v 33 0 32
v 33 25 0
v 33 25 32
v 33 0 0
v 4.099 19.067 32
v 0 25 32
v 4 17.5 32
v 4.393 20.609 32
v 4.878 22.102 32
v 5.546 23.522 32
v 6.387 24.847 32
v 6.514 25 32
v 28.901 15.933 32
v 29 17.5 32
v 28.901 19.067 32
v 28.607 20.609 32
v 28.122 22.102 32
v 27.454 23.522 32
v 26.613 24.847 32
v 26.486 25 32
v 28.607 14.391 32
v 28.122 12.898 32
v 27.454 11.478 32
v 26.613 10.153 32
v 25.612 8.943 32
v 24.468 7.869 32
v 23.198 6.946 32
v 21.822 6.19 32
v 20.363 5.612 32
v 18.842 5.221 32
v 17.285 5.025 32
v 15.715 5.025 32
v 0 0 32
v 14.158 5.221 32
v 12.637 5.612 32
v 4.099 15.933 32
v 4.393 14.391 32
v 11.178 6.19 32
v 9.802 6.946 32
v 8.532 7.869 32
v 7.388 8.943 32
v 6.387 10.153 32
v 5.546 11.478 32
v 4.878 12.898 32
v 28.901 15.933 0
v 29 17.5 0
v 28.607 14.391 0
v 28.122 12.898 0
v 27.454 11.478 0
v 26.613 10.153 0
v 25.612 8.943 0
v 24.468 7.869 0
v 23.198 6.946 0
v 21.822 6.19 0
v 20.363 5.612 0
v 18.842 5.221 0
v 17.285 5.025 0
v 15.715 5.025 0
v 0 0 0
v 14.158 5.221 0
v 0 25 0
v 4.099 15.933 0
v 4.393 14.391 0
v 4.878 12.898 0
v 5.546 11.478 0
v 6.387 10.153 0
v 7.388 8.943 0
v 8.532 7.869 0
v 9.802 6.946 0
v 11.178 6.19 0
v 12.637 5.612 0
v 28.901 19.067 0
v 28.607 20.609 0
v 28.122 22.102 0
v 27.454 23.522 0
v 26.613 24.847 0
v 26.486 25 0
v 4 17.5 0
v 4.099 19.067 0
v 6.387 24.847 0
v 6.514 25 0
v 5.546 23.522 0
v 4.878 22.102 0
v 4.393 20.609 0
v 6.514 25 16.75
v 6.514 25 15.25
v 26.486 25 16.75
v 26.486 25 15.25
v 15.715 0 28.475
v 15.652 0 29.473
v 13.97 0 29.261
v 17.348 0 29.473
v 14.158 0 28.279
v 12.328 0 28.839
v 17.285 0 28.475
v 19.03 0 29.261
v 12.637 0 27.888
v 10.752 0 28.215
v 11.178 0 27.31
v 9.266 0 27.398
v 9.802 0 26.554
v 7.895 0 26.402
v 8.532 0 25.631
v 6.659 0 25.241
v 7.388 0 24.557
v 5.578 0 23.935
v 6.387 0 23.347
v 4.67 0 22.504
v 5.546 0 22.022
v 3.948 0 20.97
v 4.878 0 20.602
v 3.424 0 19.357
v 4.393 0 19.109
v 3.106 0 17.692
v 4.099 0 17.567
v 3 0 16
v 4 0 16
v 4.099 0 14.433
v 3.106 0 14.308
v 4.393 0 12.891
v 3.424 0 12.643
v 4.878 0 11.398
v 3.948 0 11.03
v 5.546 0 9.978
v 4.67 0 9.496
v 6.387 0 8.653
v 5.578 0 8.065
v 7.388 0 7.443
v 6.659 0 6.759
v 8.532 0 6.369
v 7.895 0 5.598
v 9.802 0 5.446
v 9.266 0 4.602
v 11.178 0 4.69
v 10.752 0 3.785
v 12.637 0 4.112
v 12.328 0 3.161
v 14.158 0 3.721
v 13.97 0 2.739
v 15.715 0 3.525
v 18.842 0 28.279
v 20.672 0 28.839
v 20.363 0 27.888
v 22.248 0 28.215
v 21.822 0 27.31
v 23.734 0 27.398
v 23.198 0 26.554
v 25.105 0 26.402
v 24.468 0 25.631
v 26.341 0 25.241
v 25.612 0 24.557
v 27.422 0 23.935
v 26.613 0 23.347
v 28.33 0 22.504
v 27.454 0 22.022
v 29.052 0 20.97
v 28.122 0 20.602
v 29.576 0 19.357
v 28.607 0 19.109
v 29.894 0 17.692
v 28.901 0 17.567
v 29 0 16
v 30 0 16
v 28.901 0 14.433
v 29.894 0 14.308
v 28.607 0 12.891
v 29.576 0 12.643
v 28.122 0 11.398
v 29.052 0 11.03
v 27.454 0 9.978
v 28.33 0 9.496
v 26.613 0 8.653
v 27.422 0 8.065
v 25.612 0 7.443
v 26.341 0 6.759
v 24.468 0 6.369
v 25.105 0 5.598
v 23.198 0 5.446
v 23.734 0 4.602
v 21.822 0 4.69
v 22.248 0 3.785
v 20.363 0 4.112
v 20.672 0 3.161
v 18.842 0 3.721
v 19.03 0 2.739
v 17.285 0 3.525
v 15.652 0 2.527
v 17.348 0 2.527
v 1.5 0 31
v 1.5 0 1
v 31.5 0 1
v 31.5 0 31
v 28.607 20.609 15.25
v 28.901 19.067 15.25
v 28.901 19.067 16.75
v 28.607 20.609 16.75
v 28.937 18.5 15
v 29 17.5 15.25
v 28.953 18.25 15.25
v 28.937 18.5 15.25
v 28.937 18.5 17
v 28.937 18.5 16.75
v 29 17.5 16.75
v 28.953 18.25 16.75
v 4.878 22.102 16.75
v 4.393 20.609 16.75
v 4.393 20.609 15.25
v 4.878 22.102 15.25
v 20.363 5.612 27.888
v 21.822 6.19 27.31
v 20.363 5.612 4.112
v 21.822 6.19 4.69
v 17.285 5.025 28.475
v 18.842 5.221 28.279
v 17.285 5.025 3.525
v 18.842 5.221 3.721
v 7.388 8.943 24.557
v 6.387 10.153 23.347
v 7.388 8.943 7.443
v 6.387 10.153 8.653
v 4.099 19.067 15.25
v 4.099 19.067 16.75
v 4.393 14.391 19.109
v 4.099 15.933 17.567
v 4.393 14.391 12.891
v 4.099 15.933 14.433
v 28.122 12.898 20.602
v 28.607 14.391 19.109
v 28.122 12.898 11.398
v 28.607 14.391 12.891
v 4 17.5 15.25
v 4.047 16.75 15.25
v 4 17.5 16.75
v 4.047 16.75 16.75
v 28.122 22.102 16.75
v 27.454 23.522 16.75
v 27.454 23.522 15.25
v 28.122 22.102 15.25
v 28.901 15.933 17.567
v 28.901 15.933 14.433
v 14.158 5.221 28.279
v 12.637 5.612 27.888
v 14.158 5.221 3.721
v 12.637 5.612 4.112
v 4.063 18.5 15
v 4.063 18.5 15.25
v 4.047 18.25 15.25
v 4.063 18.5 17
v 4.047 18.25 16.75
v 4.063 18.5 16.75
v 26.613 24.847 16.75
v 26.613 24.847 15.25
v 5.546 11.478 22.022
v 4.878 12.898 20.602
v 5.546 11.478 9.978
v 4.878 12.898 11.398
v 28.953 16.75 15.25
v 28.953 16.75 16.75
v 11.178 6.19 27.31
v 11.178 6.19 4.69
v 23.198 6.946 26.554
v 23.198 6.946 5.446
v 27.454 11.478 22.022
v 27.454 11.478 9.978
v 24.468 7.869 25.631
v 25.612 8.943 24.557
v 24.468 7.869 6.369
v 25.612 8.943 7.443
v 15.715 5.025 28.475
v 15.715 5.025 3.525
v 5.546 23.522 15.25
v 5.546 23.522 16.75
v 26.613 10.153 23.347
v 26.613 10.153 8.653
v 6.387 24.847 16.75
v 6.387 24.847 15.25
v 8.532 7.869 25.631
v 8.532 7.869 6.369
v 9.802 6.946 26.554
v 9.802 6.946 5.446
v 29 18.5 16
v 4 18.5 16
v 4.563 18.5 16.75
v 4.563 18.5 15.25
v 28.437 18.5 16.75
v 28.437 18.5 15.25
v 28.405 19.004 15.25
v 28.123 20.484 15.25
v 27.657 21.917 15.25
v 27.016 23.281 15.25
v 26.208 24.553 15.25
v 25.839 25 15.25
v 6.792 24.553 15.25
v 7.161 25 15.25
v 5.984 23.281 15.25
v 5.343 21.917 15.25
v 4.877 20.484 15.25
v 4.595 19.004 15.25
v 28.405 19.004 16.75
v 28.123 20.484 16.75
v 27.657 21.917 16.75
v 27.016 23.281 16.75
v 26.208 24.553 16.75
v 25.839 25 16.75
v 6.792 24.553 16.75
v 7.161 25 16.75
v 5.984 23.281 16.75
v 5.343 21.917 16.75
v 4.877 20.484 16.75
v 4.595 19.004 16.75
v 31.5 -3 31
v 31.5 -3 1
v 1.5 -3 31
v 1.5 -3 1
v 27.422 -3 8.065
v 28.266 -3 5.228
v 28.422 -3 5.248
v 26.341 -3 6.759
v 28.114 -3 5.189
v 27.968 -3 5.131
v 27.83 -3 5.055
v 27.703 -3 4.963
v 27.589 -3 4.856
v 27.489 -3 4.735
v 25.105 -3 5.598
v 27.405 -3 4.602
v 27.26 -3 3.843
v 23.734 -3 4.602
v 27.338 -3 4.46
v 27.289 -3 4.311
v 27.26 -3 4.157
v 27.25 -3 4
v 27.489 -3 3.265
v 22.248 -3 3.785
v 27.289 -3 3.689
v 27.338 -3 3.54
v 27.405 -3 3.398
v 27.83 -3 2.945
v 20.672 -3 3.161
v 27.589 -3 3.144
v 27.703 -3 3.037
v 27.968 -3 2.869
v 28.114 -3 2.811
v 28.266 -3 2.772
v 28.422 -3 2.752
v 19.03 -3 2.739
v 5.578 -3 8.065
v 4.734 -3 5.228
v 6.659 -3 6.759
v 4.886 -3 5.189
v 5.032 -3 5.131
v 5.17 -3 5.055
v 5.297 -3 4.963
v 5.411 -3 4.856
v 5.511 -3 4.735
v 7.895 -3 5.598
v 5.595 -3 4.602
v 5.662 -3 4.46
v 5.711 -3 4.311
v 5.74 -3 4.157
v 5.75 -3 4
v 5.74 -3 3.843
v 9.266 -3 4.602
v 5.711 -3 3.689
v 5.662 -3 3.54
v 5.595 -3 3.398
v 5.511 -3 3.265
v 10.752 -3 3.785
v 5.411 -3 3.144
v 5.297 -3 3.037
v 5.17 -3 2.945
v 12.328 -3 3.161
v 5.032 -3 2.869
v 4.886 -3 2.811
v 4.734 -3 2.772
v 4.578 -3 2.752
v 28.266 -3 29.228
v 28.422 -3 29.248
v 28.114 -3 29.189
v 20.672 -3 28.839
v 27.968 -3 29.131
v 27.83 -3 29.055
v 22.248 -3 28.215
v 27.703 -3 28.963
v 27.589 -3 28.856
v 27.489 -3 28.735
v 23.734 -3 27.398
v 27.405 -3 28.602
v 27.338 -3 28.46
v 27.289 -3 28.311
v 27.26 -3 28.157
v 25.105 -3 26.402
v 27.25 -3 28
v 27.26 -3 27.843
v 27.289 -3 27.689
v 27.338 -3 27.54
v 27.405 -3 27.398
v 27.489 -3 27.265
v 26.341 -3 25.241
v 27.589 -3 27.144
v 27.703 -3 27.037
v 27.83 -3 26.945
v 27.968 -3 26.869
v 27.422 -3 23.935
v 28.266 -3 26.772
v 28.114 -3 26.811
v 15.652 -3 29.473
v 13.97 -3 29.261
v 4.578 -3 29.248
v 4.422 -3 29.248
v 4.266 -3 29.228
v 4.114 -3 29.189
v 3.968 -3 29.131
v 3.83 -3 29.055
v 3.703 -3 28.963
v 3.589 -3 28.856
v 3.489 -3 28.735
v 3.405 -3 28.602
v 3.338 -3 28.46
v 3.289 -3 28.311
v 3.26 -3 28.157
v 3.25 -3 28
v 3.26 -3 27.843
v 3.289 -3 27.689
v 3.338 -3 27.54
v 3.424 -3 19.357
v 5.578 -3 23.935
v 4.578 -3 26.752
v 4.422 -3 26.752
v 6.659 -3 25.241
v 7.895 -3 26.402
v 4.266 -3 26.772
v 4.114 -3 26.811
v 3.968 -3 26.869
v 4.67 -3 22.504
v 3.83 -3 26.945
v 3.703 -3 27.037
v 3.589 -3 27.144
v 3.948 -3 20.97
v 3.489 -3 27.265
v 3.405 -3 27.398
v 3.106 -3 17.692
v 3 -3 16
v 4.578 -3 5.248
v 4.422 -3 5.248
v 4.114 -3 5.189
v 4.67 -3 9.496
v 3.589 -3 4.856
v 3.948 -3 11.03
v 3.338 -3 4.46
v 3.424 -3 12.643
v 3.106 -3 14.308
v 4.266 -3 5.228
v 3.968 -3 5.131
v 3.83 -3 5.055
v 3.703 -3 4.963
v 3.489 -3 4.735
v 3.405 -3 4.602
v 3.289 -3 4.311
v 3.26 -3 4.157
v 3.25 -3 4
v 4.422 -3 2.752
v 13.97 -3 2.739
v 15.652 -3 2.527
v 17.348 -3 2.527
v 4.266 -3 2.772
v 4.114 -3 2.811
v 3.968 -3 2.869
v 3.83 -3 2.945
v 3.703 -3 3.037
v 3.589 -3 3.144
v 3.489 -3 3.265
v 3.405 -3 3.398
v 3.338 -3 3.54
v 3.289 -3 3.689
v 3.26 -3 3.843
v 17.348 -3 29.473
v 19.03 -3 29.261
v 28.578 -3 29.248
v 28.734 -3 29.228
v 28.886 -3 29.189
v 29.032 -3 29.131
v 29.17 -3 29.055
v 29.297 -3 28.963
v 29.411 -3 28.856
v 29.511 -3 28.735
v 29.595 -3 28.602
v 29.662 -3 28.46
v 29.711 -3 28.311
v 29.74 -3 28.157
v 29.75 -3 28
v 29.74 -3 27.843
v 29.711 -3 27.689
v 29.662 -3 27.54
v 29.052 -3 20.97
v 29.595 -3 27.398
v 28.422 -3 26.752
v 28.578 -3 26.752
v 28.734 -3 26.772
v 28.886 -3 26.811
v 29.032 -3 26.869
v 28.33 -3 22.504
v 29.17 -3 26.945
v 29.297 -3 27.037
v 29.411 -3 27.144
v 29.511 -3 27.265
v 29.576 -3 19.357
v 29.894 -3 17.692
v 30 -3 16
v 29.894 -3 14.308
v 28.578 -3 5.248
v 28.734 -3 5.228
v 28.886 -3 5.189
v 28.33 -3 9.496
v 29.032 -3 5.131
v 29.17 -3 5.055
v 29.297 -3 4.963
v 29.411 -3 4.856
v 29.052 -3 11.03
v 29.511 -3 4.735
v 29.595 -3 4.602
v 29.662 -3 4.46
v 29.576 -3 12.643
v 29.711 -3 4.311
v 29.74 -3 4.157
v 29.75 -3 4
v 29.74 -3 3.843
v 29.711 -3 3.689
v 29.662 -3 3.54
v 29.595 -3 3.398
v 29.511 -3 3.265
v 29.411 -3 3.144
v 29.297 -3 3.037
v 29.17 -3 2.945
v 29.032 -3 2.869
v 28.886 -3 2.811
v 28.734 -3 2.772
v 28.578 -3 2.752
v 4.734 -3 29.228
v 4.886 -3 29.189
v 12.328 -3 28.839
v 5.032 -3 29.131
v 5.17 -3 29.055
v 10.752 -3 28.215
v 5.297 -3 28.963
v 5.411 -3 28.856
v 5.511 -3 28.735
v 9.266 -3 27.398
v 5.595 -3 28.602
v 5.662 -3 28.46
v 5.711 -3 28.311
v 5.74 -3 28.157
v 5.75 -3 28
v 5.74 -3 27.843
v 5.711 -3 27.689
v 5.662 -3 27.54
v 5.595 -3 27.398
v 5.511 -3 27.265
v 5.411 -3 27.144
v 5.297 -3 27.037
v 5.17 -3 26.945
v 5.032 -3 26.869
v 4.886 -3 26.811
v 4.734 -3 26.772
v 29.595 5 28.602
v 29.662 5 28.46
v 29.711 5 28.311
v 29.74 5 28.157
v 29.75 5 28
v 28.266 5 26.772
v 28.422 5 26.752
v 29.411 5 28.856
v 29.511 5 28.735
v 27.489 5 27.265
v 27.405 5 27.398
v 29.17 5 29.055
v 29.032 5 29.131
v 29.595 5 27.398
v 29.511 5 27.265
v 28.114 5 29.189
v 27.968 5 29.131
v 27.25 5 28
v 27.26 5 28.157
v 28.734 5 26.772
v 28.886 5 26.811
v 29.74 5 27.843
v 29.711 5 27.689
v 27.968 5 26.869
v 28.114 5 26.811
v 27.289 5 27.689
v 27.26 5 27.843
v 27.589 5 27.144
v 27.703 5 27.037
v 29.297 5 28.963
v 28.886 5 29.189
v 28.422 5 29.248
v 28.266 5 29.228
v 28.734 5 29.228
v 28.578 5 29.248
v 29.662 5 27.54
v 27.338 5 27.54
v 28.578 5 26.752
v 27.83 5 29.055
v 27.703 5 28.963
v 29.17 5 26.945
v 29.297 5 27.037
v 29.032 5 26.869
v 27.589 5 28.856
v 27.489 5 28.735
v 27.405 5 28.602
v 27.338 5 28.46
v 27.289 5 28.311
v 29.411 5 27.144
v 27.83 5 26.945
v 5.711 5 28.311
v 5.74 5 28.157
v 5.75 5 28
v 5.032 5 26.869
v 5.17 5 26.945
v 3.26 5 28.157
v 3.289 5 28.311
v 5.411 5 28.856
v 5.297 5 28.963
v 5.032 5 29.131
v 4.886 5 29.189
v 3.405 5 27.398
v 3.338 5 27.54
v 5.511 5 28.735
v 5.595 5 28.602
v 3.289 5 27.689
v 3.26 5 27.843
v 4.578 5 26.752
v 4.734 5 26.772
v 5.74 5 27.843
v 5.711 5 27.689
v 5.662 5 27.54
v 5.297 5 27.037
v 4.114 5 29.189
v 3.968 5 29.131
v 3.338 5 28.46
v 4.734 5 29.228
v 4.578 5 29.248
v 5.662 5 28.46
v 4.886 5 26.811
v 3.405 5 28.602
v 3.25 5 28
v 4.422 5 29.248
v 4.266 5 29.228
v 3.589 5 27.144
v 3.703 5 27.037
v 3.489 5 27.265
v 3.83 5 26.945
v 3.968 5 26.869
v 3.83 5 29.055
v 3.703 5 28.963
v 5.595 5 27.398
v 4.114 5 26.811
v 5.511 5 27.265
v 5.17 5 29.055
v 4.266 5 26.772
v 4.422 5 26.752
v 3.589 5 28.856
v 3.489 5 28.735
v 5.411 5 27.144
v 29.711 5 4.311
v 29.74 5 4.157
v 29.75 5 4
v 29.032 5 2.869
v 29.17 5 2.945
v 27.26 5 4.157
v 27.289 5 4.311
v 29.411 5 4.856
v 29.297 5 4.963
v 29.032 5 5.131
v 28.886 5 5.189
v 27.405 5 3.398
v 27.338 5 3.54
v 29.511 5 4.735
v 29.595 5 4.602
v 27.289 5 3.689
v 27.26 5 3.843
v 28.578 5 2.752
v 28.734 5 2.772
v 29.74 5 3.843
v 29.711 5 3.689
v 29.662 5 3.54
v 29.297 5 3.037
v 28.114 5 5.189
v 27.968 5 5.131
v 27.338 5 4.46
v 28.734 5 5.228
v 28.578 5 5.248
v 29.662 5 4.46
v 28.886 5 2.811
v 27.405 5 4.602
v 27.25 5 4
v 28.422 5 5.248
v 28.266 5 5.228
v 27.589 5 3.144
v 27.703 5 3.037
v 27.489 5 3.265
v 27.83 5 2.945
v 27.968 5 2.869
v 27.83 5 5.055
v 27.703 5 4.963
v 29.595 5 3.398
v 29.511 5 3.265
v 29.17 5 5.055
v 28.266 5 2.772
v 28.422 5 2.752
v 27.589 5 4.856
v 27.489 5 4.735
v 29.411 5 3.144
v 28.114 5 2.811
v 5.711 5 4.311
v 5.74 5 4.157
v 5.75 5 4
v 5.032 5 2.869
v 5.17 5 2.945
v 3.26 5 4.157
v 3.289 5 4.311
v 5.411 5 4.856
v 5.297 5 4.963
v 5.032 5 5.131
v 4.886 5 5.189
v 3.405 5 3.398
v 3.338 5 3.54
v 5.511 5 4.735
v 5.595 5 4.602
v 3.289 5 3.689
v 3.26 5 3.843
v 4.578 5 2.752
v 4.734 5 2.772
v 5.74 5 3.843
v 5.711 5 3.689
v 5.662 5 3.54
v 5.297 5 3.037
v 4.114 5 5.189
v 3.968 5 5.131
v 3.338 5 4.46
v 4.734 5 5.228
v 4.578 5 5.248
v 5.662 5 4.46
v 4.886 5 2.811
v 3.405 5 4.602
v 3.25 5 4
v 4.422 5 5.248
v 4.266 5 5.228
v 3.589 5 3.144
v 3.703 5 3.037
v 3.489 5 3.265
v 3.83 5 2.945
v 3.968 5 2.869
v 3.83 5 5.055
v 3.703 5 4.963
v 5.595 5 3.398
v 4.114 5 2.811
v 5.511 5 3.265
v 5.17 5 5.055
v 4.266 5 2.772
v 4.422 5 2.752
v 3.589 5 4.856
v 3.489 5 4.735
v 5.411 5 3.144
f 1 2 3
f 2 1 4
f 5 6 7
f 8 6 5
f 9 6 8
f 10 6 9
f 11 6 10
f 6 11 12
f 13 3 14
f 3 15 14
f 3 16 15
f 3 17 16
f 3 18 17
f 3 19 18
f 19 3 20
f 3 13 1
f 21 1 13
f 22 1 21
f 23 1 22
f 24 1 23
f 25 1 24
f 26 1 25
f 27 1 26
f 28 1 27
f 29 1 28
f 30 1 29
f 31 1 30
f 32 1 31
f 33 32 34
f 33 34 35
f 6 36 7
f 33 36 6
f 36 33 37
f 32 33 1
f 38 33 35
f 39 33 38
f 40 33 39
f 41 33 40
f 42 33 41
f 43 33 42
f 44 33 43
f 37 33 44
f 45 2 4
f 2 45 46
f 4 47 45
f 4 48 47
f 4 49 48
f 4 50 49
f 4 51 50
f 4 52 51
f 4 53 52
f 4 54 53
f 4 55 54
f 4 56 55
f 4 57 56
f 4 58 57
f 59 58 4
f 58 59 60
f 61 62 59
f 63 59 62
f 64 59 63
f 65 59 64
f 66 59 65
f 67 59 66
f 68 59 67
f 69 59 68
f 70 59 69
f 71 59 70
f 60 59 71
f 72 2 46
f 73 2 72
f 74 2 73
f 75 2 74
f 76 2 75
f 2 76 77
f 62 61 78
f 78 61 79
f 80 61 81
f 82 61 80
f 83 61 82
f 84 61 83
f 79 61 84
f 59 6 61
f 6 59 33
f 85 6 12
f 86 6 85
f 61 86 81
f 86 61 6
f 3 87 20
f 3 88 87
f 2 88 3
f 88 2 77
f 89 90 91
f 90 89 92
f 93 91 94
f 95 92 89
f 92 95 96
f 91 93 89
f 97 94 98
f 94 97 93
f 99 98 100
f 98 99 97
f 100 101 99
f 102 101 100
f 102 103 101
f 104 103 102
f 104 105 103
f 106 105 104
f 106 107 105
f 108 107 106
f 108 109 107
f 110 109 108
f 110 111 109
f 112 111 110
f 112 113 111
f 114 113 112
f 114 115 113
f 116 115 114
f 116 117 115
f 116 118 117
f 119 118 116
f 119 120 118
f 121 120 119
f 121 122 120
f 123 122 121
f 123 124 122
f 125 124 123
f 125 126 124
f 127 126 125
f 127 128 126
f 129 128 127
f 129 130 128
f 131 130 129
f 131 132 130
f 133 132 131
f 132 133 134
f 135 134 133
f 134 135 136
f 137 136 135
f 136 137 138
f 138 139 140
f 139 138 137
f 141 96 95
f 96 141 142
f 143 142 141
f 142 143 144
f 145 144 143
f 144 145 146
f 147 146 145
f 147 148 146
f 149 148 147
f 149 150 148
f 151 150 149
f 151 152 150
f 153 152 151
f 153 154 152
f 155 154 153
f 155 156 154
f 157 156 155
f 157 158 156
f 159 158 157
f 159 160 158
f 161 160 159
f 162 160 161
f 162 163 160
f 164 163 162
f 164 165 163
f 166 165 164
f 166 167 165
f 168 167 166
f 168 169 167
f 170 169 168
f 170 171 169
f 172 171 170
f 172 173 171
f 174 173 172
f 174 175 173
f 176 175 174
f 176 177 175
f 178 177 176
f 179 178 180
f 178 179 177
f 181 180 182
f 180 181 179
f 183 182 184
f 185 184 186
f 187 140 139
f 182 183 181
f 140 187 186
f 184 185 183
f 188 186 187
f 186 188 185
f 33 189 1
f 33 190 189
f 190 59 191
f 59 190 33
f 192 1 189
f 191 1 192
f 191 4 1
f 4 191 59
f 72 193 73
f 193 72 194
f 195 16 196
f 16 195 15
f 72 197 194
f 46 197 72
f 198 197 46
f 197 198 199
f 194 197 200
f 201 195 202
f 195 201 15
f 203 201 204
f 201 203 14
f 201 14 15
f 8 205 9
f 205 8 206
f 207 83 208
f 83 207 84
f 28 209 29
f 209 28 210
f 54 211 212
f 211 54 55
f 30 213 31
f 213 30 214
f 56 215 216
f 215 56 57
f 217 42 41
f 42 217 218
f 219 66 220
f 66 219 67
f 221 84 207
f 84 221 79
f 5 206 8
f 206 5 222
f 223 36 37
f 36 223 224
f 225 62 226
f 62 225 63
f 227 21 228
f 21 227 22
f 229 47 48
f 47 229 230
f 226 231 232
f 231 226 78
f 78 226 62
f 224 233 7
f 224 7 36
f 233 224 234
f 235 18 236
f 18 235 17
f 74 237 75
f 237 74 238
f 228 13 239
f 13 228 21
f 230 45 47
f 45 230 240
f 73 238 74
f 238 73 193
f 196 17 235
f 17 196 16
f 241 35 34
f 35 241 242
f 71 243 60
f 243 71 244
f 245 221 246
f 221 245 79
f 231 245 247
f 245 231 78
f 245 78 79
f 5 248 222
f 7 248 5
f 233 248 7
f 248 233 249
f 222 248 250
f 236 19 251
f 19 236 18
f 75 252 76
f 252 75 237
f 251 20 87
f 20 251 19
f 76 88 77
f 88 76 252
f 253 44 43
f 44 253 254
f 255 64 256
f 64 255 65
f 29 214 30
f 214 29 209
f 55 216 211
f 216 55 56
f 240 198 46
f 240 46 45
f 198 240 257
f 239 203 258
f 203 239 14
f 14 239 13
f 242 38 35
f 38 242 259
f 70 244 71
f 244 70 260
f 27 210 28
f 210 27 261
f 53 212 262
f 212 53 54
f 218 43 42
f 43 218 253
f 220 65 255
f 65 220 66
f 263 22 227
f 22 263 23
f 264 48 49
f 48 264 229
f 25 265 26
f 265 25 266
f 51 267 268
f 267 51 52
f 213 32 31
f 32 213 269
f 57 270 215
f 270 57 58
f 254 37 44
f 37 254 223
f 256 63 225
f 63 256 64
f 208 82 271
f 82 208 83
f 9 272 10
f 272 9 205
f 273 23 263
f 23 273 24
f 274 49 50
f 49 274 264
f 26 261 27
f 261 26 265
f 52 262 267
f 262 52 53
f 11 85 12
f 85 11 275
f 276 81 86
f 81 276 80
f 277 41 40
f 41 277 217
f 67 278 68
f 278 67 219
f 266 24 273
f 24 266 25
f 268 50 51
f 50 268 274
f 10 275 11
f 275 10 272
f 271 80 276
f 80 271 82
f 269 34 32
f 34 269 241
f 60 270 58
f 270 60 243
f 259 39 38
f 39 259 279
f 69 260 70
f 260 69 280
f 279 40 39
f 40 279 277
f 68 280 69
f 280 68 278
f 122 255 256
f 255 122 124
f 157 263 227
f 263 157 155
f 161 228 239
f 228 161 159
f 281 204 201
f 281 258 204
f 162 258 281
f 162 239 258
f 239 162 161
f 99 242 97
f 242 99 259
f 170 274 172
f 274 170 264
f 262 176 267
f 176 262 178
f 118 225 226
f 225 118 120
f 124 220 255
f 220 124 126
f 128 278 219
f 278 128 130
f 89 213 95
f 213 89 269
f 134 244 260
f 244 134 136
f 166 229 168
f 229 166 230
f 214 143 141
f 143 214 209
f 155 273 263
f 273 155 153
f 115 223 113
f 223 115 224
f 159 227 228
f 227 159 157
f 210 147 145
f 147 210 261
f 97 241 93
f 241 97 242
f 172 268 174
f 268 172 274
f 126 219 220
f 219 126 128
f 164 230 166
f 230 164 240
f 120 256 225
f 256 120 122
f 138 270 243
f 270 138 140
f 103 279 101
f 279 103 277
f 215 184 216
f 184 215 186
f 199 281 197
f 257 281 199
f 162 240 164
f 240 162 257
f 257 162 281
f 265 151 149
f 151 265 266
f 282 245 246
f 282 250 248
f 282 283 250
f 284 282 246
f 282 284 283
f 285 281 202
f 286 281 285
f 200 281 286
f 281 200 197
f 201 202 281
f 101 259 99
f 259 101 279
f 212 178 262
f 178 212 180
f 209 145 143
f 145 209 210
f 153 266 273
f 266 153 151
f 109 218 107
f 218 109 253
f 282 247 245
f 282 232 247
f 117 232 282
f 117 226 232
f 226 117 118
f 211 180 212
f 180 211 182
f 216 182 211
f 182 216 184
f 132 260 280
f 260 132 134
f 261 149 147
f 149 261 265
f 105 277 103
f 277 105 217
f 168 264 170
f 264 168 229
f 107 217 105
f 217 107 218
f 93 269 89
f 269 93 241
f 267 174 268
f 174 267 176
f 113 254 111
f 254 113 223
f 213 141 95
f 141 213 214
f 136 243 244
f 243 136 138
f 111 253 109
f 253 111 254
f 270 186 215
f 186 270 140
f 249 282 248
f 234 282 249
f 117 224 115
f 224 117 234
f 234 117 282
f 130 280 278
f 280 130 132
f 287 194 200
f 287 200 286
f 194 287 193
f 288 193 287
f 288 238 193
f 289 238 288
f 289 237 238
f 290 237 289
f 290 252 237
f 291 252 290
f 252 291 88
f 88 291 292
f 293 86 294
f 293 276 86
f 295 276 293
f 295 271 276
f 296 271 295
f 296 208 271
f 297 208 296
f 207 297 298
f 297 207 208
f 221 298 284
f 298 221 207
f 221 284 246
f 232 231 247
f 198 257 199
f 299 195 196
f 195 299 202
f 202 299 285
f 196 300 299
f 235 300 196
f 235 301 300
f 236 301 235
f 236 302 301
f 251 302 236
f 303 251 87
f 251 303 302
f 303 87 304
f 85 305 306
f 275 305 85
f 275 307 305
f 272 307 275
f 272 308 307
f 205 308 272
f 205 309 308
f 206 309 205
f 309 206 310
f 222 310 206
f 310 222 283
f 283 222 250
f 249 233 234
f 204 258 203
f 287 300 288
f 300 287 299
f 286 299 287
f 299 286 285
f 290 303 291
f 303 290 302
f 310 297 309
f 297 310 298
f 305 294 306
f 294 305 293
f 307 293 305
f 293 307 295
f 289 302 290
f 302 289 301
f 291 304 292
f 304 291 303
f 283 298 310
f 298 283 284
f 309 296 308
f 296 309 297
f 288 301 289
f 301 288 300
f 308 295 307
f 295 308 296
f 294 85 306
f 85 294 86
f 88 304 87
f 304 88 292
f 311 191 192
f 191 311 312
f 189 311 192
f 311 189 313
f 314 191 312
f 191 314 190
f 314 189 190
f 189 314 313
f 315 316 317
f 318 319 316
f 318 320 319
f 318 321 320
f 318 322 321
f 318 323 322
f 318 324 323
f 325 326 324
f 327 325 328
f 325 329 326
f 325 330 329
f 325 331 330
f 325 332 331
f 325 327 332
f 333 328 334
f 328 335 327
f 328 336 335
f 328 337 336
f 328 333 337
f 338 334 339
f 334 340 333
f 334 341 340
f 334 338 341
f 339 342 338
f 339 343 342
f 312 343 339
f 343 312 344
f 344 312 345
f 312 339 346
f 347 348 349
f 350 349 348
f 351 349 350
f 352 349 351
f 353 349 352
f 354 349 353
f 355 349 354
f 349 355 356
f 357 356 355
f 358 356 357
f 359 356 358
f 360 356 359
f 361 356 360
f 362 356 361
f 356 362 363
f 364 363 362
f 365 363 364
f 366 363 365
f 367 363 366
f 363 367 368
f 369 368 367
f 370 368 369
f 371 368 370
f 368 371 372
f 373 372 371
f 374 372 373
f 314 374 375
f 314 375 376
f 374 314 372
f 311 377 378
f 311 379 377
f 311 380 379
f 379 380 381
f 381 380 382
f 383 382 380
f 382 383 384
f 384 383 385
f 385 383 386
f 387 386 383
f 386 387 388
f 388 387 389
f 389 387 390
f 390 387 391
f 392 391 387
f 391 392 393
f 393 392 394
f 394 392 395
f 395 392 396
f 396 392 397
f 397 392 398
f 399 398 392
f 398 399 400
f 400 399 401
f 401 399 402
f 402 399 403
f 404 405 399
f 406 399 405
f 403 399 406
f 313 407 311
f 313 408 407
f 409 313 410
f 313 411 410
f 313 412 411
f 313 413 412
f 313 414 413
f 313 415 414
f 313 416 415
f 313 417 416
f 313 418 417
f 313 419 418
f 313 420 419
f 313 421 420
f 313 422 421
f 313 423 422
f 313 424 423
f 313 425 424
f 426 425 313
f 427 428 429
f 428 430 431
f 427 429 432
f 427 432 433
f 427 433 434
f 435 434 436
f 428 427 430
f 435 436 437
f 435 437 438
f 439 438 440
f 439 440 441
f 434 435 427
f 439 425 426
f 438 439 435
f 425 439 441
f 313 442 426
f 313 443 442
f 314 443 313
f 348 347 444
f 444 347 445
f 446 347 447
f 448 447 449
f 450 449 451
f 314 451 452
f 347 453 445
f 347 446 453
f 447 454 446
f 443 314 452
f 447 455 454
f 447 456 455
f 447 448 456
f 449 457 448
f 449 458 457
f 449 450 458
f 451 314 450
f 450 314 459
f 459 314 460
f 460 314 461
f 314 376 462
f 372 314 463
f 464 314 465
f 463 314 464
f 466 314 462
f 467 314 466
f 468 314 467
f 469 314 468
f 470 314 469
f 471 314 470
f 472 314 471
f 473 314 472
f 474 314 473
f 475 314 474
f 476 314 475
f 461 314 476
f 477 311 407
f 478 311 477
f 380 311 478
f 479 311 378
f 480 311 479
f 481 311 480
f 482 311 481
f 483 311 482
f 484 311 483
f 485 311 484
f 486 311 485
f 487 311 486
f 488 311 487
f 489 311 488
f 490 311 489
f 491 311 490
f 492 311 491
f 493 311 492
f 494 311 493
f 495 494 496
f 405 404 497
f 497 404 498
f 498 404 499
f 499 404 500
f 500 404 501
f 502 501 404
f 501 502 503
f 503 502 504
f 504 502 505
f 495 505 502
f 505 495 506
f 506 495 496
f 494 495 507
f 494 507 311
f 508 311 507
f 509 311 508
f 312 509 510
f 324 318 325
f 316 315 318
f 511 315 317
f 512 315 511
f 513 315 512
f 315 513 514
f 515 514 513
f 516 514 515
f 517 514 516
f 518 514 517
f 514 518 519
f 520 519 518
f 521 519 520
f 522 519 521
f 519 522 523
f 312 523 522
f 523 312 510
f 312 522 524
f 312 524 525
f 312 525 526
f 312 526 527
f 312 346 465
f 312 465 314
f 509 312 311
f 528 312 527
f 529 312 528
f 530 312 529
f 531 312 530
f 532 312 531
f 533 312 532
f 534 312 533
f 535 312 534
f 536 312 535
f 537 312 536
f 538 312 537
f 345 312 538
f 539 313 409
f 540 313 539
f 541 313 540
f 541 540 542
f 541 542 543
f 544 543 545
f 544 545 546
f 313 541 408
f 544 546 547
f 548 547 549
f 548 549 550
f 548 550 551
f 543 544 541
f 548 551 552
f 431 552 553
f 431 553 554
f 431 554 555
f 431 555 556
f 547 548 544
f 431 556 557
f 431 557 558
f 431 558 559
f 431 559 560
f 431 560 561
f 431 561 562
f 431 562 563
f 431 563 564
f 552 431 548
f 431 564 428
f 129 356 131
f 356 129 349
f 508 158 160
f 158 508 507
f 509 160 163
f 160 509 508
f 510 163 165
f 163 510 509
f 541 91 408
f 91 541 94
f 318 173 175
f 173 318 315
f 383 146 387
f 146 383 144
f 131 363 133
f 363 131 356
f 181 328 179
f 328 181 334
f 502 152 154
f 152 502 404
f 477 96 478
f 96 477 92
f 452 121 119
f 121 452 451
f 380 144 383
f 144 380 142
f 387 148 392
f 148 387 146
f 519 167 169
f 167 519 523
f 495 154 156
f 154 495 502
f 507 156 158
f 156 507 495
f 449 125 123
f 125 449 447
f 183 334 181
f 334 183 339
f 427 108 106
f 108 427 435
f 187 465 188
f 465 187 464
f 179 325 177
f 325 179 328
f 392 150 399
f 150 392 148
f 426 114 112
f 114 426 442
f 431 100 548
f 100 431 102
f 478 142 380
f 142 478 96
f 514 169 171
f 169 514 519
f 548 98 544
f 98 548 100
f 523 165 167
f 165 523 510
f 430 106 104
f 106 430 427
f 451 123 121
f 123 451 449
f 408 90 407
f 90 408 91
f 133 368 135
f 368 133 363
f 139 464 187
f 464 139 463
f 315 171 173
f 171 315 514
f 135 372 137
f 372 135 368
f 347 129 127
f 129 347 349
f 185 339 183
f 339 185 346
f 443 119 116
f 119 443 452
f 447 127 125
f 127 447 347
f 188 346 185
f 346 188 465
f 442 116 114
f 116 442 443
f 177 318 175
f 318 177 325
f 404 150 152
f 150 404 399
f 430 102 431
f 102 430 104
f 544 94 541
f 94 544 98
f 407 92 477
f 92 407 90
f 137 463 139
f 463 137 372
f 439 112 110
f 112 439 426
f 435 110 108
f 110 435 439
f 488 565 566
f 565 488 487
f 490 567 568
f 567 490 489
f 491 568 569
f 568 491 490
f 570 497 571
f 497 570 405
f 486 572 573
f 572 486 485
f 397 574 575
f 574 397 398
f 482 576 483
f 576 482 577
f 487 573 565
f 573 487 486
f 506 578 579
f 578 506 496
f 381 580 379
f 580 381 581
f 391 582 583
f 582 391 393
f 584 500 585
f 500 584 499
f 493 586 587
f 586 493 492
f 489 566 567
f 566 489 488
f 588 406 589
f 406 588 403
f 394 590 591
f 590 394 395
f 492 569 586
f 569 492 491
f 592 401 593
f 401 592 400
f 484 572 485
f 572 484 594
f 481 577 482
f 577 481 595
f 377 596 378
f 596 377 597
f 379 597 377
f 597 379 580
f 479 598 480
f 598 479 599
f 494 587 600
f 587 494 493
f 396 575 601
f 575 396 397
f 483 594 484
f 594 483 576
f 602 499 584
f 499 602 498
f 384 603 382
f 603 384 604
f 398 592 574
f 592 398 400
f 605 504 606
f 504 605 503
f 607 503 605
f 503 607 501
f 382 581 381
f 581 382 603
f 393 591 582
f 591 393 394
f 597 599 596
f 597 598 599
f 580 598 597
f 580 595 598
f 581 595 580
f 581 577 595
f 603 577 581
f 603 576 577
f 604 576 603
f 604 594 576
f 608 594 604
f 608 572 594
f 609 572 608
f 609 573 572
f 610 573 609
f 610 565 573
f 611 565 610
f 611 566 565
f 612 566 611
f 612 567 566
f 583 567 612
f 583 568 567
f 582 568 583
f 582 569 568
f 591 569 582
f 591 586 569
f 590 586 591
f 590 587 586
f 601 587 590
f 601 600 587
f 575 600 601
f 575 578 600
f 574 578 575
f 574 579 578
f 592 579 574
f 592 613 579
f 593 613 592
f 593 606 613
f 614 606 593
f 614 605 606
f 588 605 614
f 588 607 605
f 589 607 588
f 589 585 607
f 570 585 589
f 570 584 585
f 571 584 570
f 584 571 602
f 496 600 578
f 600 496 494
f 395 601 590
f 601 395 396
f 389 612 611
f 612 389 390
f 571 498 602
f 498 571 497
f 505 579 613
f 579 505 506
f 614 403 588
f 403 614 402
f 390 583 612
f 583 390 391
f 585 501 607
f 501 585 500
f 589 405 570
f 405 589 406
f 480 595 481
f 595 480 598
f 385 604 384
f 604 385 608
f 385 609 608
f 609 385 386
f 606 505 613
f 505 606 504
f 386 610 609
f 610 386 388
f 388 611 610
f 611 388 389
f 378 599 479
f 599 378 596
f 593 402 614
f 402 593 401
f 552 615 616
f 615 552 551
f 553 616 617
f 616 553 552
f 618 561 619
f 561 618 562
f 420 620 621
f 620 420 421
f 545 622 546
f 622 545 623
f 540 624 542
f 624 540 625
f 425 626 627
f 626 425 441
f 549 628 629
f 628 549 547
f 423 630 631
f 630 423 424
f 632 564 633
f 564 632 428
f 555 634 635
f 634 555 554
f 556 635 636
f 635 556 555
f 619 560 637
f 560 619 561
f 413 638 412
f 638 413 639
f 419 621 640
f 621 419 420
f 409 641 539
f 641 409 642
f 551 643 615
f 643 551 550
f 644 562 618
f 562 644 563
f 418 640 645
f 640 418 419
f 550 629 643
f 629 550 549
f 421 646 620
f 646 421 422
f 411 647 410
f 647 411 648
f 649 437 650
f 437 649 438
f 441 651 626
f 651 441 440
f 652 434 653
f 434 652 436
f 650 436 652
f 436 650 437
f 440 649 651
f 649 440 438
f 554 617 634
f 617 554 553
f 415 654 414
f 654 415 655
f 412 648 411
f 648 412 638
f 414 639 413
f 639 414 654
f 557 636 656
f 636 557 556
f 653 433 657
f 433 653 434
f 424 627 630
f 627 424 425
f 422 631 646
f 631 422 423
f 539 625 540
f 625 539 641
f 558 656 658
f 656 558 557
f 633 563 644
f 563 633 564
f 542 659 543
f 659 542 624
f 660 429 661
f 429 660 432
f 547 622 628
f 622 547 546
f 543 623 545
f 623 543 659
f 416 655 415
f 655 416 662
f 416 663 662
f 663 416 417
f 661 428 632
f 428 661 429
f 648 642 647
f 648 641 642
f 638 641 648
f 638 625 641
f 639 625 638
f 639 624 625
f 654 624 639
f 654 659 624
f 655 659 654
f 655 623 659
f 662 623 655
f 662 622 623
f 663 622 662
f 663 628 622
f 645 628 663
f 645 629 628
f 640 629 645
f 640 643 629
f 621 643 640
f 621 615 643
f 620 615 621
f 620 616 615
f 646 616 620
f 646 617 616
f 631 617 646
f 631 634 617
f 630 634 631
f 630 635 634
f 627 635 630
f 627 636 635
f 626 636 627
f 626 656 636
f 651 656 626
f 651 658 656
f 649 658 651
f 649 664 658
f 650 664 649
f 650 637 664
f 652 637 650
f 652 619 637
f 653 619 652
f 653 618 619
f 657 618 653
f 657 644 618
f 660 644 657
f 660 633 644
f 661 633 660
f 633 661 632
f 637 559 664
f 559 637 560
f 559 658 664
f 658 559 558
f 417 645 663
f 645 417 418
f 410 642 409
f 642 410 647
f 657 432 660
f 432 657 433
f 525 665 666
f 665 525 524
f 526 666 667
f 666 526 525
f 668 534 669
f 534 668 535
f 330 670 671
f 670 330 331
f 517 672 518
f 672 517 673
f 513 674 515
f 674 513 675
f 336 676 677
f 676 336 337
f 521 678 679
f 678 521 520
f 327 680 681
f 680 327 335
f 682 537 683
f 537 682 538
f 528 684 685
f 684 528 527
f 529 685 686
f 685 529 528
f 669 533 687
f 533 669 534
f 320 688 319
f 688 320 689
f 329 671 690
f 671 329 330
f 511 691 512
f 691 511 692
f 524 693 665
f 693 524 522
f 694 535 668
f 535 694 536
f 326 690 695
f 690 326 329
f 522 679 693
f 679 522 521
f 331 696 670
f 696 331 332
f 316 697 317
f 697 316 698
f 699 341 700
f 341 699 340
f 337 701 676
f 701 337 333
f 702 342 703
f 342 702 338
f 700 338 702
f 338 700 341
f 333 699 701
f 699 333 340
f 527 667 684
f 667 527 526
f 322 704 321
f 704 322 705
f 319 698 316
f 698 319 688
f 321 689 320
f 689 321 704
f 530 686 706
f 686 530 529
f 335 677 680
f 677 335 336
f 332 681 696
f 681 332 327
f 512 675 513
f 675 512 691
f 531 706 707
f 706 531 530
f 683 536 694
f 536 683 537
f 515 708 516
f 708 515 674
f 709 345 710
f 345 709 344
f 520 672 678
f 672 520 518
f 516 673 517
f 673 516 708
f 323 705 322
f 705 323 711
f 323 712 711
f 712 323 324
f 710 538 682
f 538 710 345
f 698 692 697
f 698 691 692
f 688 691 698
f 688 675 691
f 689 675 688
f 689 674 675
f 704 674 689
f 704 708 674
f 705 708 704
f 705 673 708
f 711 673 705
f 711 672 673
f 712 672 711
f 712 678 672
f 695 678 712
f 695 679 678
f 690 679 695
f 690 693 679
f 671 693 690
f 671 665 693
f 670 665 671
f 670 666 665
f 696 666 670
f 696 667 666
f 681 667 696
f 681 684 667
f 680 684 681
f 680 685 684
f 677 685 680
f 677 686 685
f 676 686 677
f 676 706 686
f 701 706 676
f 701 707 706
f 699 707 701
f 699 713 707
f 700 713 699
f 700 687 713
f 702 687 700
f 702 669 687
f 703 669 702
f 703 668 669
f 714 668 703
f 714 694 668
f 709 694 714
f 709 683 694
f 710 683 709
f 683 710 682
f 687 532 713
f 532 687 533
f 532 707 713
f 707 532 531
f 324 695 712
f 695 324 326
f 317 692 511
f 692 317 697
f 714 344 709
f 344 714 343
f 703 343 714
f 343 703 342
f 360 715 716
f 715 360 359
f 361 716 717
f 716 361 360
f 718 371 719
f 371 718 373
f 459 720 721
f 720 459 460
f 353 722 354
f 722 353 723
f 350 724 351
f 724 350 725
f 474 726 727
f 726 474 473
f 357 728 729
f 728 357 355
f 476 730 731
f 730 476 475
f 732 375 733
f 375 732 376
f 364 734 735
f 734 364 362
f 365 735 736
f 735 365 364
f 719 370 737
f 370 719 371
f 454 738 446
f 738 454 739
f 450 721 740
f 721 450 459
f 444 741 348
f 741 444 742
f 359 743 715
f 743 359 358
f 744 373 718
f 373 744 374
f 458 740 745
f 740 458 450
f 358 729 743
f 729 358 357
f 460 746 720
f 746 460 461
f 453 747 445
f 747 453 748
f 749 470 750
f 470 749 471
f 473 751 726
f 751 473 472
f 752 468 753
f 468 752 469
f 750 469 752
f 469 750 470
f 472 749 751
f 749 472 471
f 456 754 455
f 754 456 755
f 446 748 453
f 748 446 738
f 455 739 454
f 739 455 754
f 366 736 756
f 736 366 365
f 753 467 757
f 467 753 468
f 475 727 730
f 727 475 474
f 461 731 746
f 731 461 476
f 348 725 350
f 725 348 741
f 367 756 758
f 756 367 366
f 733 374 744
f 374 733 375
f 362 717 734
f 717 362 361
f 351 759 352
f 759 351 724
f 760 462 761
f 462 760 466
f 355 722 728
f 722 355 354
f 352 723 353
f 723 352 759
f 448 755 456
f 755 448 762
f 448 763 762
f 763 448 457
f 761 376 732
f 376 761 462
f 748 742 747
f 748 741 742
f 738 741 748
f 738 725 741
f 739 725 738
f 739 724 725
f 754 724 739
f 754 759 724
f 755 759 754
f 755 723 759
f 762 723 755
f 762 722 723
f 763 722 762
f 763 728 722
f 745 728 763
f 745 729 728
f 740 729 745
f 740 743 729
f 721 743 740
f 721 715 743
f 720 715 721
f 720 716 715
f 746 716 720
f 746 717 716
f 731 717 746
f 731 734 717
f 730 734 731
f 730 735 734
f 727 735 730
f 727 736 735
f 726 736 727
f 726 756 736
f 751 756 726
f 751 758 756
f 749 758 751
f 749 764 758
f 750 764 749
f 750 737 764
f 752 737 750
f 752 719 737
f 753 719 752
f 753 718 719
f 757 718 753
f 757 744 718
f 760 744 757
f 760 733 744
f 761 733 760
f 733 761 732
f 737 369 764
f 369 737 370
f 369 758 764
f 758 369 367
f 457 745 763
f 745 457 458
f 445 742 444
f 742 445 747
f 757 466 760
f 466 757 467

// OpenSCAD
/*
 * Hotend Duct Cooler Generator. 
 * 
 * http://www.thingiverse.com/thing:1740504
 * 
 * By: Maxstupo
 */

// (Preset compatible with Sunhokey Prusa i3 2015)
// Variables preset for E3D v5 hotend (I think)

$fn = 50;


sideThickness = 4;
backThickness = 5;

// The height of the hot end cooling fins (or the height of the mount).
height = 32;

// The diameter of the hot end cooling fins.
hotendFinDiameter = 25;

/*[Fan Mount]*/

// The fan size used (eg. 30x30)
fanSize = 30;

// The inside diameter of the fan.
innerFanDiameter = 27;

// The spacing between the holes. (center to center)
fanMountHoleSize = 24;

// The plate thickness for the fan.
fanPlateThickness = 3;

// The length of the duct.
ductLength = 0;

// The thickness of the duct.
ductThickness = 2;

// The hole diameter for the fan mount holes.
fanPlateMountHoleDiameter = 2.5;

// The depth of the holes for the fan mount.
fanPlateMountHoleDepth = 5;

fanMountLength = fanPlateThickness+ductLength;

/*[Holder Tab]*/
tabHeightOffset = 0;
tabLength = 1;
tabThickness = 1.5;


width = hotendFinDiameter+sideThickness*2;
length = hotendFinDiameter;


module fanHole() {
    
    // Fan hole.
    fanHoleheight = length/2+backThickness;
    
    translate([width/2,fanHoleheight+1,height/2])rotate([90,0,0]) 
    cylinder(h=fanHoleheight+2,d=hotendFinDiameter,d2=hotendFinDiameter);
        
}

difference(){
    union() {
        difference() {
            cube([width,length,height]);
            
            // Slot for clipping onto the hotend.
            translate([width/2,length/2+backThickness,-1]) cylinder(h=height+2,d=hotendFinDiameter);
            
            fanHole();
        }
    
        // Tab to prevent mount sliding off the hotend.
        difference() {
            translate([width/2,length/2+backThickness,height/2-tabThickness/2+tabHeightOffset]) 
            cylinder(h=tabThickness, d=hotendFinDiameter);
            
            translate([width/2,length/2+backThickness,height/2-tabThickness/2+tabHeightOffset-1]) 
            cylinder(h=tabThickness+2,d=hotendFinDiameter-tabLength);
           
            fanHole(); 
            translate([0,length,0]) cube([width,backThickness,height]);
        }
        
        
        // Duct & Plate
        translate([width/2-fanSize/2,0,height/2-fanSize/2]) {
         
                // Plate
                difference() {
                    translate([0,-fanMountLength,0]) cube([fanSize,fanPlateThickness,fanSize]);
                    translate([fanSize/2,fanPlateThickness+0.5-fanMountLength,fanSize/2]) rotate([90,0,0]) cylinder(h=fanPlateThickness+1,d=innerFanDiameter);
                }
        
                // Duct
                difference() {
                    dd1 = hotendFinDiameter;
                    dd2 = innerFanDiameter;
                    
                    translate([fanSize/2,0,fanSize/2])  rotate([90,0,0]) cylinder(h=fanMountLength-fanPlateThickness,d=dd1+ductThickness,d2=dd2+ductThickness);     
                    translate([fanSize/2,0.25,fanSize/2])  rotate([90,0,0]) cylinder(h=fanMountLength-fanPlateThickness+0.5,d=dd1,d2=dd2);
                
                }
            
        }
        
    }
    
    // Fan mount holes.
    translate([width/2-fanSize/2,0,height/2-fanSize/2]) {
            translate([fanSize/2+fanMountHoleSize/2,fanPlateThickness-fanMountLength+fanPlateMountHoleDepth,fanSize/2+fanMountHoleSize/2]) rotate([90,0,0]) cylinder(h=fanPlateThickness+fanPlateMountHoleDepth,d=fanPlateMountHoleDiameter);
            translate([fanSize/2-fanMountHoleSize/2,fanPlateThickness-fanMountLength+fanPlateMountHoleDepth,fanSize/2+fanMountHoleSize/2]) rotate([90,0,0]) cylinder(h=fanPlateThickness+fanPlateMountHoleDepth,d=fanPlateMountHoleDiameter);
                    
            translate([fanSize/2+fanMountHoleSize/2,fanPlateThickness-fanMountLength+fanPlateMountHoleDepth,fanSize/2-fanMountHoleSize/2]) rotate([90,0,0]) cylinder(h=fanPlateThickness+fanPlateMountHoleDepth,d=fanPlateMountHoleDiameter);
            translate([fanSize/2-fanMountHoleSize/2,fanPlateThickness-fanMountLength+fanPlateMountHoleDepth,fanSize/2-fanMountHoleSize/2]) rotate([90,0,0]) cylinder(h=fanPlateThickness+fanPlateMountHoleDepth,d=fanPlateMountHoleDiameter);
    }
}
